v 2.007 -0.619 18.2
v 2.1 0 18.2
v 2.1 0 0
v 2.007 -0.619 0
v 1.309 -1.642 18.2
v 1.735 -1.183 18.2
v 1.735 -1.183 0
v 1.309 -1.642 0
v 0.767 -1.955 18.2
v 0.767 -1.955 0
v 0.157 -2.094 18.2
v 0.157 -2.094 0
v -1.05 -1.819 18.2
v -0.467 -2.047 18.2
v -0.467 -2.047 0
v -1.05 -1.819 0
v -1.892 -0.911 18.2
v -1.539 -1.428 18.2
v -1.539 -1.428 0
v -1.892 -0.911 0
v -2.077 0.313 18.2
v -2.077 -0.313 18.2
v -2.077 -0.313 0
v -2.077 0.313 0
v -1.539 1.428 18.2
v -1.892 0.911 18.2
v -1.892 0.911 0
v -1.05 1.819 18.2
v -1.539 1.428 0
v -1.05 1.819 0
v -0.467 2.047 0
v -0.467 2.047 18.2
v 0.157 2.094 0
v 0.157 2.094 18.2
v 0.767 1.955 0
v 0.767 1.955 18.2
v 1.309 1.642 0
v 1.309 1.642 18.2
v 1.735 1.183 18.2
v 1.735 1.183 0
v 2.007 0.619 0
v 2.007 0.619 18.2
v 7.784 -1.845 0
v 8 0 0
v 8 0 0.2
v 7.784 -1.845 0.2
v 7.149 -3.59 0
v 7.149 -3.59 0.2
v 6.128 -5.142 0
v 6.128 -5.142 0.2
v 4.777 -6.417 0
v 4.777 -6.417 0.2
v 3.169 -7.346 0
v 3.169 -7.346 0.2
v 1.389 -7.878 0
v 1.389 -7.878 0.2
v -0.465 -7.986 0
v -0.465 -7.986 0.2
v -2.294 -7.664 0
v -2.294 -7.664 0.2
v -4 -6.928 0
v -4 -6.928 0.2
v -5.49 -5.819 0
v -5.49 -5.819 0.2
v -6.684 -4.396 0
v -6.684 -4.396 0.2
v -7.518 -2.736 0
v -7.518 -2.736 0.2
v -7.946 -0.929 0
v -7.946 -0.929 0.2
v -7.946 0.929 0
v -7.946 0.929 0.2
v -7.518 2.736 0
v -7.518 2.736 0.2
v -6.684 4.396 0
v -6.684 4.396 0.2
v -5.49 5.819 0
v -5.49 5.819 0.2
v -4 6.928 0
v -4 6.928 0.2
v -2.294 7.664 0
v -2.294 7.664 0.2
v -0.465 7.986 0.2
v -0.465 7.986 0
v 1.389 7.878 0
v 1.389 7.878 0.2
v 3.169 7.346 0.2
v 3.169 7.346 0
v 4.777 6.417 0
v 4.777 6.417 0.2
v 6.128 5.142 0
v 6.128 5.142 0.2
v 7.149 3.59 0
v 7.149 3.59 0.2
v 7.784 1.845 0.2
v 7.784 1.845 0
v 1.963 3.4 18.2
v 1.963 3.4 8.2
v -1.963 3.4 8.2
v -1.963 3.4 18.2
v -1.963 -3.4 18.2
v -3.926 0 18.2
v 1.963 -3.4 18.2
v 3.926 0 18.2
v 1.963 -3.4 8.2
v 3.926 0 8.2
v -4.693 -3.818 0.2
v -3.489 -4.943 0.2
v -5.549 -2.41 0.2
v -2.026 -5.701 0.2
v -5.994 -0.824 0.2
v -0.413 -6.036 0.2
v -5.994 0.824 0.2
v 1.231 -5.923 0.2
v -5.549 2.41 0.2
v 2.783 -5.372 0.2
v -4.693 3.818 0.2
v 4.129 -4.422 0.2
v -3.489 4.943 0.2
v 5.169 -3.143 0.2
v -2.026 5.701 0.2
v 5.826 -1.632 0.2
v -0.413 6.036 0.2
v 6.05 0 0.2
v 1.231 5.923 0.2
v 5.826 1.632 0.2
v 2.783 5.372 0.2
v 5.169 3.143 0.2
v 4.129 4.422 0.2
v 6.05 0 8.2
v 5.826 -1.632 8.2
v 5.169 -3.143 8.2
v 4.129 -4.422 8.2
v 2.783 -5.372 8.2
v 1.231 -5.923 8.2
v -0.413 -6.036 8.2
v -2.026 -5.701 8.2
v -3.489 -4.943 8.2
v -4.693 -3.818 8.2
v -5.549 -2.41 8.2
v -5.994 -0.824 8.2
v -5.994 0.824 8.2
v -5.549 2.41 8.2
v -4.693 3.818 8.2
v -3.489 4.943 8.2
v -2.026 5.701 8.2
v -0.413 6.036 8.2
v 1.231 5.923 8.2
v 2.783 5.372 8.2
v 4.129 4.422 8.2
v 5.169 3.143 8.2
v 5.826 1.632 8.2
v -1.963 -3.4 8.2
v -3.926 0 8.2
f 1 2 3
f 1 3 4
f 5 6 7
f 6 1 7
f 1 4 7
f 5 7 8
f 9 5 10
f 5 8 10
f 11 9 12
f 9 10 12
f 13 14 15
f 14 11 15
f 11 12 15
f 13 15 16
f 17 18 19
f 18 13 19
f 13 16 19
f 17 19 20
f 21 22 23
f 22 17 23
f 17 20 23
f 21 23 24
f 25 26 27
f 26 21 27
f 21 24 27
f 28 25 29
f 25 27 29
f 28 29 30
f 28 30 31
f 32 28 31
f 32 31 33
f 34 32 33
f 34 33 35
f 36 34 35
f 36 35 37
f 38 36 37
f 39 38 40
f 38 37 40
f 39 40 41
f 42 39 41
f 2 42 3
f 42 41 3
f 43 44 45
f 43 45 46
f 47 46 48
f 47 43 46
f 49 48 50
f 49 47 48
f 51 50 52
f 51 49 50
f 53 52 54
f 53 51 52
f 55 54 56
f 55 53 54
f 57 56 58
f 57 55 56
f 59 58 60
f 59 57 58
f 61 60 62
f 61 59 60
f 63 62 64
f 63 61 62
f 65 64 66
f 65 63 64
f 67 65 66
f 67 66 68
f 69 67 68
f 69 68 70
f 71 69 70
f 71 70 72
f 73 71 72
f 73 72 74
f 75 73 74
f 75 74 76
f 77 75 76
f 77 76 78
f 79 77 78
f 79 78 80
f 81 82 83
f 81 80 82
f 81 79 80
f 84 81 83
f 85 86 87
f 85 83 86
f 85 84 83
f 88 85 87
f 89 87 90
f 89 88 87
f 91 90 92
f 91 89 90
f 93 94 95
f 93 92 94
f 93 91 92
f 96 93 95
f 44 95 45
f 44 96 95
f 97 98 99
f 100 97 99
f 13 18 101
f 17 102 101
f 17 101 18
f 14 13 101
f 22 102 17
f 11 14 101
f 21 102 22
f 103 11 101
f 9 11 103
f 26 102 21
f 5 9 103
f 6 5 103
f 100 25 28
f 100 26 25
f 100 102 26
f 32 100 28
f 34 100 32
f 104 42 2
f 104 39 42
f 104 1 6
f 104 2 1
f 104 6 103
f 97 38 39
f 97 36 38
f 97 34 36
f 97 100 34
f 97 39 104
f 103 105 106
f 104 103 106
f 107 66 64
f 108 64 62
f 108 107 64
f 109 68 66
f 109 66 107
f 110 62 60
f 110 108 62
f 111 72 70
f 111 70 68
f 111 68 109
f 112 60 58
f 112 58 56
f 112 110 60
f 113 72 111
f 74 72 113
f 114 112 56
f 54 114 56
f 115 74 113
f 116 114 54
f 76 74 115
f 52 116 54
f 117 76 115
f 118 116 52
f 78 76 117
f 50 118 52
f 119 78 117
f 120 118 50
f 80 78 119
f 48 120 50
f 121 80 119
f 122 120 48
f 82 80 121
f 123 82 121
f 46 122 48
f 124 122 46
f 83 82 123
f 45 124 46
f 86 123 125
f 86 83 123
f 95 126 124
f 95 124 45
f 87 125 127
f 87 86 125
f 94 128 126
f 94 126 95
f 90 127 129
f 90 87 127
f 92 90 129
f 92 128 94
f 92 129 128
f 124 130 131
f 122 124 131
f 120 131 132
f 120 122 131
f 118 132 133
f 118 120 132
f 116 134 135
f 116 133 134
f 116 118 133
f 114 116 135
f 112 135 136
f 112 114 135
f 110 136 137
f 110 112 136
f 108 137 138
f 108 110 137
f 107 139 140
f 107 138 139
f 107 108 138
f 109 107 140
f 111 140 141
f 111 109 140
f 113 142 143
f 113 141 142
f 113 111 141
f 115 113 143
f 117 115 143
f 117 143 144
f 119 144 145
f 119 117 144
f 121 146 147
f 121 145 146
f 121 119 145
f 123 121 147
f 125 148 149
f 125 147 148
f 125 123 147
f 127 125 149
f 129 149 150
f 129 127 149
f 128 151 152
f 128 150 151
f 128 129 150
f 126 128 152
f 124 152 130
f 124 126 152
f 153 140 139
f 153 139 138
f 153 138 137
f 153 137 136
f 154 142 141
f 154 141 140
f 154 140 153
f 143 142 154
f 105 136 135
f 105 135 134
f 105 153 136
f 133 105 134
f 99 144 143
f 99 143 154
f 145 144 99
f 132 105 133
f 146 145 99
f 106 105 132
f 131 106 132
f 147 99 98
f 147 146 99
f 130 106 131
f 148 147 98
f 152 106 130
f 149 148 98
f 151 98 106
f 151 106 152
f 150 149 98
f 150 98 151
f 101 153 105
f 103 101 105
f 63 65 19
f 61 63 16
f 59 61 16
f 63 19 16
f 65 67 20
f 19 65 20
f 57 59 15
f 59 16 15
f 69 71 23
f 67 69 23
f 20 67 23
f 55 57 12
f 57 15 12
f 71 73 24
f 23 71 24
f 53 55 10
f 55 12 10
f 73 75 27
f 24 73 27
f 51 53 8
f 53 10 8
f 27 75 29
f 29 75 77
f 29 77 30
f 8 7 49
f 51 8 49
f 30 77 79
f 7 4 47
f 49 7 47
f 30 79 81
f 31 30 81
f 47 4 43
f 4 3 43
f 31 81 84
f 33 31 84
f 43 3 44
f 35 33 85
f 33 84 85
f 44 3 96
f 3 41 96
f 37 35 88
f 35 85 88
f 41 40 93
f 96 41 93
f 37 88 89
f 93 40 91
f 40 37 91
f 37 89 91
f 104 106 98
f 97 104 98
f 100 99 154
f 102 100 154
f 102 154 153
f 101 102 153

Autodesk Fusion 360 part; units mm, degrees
sketch "Sketch2" plane through (0, 0, 0) normal (0, 0, 1) x (1, 0, 0)
  circle A0 centre (0, 0) radius 9
  circle A1 centre (0, 0) radius 8
  circle A2 centre (0, 0) radius 2.1
  dimension "d10" = 16
  dimension "d26" = 4.2
extrude "Extrude3" add sketch "Sketch2" along normal blind 0.2 contours A1
sketch "Sketch3" plane through (0, 0, 0.2) normal (0, 0, 1) x (1, 0, 0)
  circle A0 centre (0, 0) radius 6.05
  circle A1 centre (0, 0) radius 8
  circle A2 centre (0, 0) radius 2.1
  dimension "d13" = 12.1
extrude "Extrude4" add sketch "Sketch3" along normal blind 8 contours A0
sketch "Sketch4" plane through (0, 0, 8.2) normal (0, 0, 1) x (1, 0, 0)
  circle A0 centre (0, 0) radius 6.05
  line L0 (-1.963, 3.4) -> (-3.926, 0)
  line L1 (-3.926, 0) -> (-1.963, -3.4)
  line L2 (-1.963, -3.4) -> (1.963, -3.4)
  line L3 (1.963, -3.4) -> (3.926, 0)
  line L4 (3.926, 0) -> (1.963, 3.4)
  line L5 (1.963, 3.4) -> (-1.963, 3.4)
  circle A1 centre (0, 0) radius 2.1
  dimension "d24" = 6.8
extrude "Extrude5" add sketch "Sketch4" along normal blind 10 contours L0 L1 L2 L3 L4 L5
